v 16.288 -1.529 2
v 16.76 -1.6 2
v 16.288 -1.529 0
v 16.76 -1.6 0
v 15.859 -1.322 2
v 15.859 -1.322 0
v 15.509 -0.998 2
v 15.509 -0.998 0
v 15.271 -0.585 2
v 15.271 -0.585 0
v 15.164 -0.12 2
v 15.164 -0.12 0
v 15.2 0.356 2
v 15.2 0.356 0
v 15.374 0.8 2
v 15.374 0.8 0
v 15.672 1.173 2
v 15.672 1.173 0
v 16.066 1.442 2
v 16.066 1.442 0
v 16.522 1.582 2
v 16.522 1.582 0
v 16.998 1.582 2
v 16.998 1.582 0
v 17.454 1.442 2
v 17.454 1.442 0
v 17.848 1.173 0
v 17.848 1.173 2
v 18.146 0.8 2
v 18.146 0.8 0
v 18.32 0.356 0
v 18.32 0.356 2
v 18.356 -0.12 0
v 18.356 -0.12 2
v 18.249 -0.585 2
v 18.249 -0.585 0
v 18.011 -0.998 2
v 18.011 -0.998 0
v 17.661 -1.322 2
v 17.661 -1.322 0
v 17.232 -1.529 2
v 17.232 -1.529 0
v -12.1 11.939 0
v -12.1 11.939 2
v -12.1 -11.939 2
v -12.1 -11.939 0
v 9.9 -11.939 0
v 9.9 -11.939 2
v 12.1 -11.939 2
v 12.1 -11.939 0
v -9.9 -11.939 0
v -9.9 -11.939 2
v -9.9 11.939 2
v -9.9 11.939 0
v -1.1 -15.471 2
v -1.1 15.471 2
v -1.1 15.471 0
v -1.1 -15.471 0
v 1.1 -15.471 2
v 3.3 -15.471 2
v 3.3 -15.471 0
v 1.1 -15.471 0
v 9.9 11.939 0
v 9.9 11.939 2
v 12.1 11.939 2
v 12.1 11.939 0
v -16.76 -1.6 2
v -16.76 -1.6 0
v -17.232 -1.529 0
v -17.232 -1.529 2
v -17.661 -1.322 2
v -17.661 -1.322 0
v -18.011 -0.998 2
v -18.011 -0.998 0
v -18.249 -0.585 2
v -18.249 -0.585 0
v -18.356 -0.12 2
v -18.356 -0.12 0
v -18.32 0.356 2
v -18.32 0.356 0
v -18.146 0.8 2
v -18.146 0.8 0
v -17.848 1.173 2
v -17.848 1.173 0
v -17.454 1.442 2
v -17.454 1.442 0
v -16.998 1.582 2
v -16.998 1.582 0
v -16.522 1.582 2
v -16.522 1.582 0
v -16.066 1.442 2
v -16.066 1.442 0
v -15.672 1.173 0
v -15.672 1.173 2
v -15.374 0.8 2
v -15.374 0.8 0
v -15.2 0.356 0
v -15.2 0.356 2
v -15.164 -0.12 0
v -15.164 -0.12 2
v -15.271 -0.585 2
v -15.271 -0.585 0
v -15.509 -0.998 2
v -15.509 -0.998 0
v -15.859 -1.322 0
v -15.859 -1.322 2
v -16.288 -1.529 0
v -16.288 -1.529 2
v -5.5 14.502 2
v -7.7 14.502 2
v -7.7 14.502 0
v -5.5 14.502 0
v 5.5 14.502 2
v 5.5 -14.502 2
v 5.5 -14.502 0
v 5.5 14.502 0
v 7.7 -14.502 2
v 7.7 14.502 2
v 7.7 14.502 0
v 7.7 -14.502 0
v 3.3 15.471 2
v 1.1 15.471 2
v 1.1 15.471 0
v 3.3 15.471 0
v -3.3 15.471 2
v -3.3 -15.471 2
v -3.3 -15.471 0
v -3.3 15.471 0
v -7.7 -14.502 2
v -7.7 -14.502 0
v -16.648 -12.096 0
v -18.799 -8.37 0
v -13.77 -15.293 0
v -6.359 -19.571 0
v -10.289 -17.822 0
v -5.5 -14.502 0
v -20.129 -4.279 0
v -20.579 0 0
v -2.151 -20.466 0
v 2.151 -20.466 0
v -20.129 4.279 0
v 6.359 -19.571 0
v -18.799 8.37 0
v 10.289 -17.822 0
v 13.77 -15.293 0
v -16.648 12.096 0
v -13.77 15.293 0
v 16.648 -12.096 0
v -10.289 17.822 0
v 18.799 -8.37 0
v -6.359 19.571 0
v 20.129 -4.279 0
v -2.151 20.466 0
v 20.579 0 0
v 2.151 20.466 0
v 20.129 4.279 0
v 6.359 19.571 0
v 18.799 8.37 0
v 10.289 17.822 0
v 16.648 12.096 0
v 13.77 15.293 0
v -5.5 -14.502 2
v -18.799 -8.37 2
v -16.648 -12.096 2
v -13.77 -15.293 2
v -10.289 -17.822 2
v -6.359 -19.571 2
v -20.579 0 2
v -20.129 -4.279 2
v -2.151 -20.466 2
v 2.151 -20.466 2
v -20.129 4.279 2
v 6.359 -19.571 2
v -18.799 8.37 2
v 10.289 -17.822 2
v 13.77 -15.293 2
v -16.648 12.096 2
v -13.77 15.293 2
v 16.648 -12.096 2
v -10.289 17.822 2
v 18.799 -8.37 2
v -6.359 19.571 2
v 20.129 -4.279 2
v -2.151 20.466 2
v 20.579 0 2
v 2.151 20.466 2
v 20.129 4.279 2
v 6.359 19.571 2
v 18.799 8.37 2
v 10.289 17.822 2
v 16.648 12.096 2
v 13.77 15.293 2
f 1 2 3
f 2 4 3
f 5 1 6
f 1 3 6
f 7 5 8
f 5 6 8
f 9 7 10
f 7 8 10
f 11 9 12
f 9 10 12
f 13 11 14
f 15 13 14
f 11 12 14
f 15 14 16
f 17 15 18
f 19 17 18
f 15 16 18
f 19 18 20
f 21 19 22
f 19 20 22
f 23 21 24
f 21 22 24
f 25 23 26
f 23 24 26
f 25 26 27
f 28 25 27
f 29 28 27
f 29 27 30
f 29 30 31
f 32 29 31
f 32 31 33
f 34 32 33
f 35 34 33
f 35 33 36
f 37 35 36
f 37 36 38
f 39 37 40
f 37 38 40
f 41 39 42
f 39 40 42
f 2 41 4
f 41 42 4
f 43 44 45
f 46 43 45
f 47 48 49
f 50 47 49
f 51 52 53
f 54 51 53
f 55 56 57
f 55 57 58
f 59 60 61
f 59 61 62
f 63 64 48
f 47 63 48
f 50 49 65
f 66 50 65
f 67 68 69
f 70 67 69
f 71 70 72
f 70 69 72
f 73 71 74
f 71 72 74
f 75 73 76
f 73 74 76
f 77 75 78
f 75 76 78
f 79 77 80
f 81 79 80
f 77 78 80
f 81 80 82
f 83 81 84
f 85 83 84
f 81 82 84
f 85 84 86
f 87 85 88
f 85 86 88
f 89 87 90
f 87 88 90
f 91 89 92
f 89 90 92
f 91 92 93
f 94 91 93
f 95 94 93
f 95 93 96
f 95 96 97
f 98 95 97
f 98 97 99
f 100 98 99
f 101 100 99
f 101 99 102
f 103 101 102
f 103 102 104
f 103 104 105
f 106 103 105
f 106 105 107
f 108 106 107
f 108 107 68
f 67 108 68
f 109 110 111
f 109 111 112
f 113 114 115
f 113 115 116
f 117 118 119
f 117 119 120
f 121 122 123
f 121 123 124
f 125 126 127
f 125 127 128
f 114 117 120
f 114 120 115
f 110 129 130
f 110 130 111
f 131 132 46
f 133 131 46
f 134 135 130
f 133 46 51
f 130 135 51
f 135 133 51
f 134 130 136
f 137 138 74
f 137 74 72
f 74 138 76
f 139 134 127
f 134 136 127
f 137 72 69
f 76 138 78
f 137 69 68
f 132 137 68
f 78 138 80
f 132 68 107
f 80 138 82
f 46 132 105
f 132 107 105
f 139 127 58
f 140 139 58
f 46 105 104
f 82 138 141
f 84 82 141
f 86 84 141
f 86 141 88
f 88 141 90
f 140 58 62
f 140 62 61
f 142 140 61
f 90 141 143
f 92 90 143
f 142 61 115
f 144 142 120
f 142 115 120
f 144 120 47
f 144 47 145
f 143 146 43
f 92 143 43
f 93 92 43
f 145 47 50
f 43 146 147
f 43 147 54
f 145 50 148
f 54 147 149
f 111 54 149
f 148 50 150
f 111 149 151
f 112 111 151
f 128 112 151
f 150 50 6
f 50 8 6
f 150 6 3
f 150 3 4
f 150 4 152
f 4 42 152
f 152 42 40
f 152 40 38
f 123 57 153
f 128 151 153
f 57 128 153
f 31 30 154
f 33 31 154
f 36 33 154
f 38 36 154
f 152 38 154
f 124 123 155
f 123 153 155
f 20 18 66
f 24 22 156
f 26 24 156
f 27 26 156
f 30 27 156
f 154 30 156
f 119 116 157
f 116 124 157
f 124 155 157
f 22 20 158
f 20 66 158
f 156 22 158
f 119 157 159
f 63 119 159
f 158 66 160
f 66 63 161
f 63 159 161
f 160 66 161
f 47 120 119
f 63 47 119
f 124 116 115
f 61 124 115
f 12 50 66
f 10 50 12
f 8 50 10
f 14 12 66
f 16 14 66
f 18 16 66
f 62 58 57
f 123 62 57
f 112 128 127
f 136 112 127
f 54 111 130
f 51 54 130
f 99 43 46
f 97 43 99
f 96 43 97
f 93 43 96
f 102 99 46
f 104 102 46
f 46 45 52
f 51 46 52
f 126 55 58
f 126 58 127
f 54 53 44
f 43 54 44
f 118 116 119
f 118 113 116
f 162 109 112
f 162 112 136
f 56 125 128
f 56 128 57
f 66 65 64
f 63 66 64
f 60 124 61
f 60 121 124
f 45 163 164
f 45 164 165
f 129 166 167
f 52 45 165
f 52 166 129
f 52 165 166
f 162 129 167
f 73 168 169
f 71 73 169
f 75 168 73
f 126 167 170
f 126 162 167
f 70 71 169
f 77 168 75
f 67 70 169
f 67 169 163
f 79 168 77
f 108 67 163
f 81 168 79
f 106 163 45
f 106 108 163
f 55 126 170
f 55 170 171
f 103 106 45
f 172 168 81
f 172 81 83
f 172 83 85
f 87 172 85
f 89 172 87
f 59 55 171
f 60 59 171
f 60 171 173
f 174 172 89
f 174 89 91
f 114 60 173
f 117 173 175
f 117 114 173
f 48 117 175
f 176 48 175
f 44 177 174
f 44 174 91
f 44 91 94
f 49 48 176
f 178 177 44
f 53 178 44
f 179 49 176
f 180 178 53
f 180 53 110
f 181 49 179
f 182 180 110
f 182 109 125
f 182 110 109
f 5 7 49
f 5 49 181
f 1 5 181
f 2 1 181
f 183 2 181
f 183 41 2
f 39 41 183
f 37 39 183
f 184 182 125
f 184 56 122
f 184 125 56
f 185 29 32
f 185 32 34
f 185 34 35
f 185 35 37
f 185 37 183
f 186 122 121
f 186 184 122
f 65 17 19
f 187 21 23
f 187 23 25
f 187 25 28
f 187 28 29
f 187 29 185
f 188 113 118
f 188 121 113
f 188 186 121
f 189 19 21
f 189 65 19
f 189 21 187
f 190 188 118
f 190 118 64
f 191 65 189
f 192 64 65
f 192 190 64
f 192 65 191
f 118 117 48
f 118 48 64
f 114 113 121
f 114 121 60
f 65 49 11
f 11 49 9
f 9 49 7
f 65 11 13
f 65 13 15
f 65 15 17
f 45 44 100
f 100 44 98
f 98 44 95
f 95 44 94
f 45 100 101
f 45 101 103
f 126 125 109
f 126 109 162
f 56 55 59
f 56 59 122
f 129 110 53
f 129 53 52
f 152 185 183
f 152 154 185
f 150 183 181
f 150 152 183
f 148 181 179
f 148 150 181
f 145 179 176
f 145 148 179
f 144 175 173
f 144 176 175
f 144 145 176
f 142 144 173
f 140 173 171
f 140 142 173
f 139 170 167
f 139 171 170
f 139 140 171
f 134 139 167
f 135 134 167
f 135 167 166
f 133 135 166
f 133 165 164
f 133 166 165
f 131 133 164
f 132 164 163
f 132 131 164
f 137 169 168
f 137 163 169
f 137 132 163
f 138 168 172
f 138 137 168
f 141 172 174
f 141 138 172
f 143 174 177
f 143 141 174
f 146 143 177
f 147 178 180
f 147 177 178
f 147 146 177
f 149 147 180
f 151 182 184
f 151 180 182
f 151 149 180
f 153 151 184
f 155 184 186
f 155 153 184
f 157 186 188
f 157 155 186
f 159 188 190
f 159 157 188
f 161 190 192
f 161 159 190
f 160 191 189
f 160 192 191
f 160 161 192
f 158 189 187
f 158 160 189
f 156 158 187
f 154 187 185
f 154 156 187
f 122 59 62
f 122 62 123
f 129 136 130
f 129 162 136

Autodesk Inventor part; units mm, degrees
ref_plane "YZ Plane" through (0, 0, 0) normal (1, 0, 0) x (0, 1, 0)
ref_plane "XZ Plane" through (0, 0, 0) normal (0, 1, 0) x (-1, 0, 0)
ref_plane "XY Plane" through (0, 0, 0) normal (0, 0, 1) x (1, 0, 0)
sketch "Skizze1" plane through (0, 0, 0) normal (0, 0, 1) x (1, 0, 0)
  circle A0 centre (16.76, 0) radius 1.25 projected
  circle A1 centre (-16.76, 0) radius 1.25 projected
  line L0 (-6.25, 16) -> (-11.9414, 16) projected
  line L1 (-2.25, 20) -> (-6.25, 16) projected
  line L2 (2.25, 20) -> (-2.25, 20) projected
  line L3 (6.25, 16) -> (2.25, 20) projected
  line L4 (11.9414, 16) -> (6.25, 16) projected
  line L5 (11.9414, 16) -> (12.9414, 15) projected
  line L6 (12.9414, -15) -> (12.9414, 15) projected
  line L7 (11.9414, -16) -> (12.9414, -15) projected
  line L8 (-11.9414, -16) -> (11.9414, -16) projected
  line L9 (-11.9414, -16) -> (-12.9414, -15) projected
  line L10 (-12.9414, 15) -> (-12.9414, -15) projected
  line L11 (-12.9414, 15) -> (-11.9414, 16) projected
  circle A2 centre (0, 0) radius 20.5786 projected
  point P0 (0, 0)
extrude "Extrusion1" add sketch "Skizze1" along normal blind 2 contours L1 L2 L3 L4 L5 L6 L7 L8 L9 L10 L11 L0 | A2
sketch "Skizze2" plane through (0, 0, 2) normal (0, 0, 1) x (1, 0, 0)
  point P0 (0, 0)
sketch "Skizze3" plane through (0, 0, 2) normal (0, 0, 1) x (1, 0, 0)
  line L0 (-12.1, -11.9394) -> (-9.9, -11.9394)
  line L1 (-9.9, -11.9394) -> (-9.9, 11.9394)
  line L2 (-9.9, 11.9394) -> (-12.1, 11.9394)
  line L3 (-12.1, 11.9394) -> (-12.1, -11.9394)
  line L4 (-7.7, 14.502) -> (-5.5, 14.502)
  line L5 (-5.5, 14.502) -> (-5.5, -14.502)
  line L6 (-5.5, -14.502) -> (-7.7, -14.502)
  line L7 (-7.7, -14.502) -> (-7.7, 14.502)
  line L8 (-3.3, 15.4709) -> (-1.1, 15.4709)
  line L9 (-1.1, 15.4709) -> (-1.1, -15.4709)
  line L10 (-1.1, -15.4709) -> (-3.3, -15.4709)
  line L11 (-3.3, -15.4709) -> (-3.3, 15.4709)
  circle A0 centre (-16.76, 0) radius 1.25 projected
  circle A1 centre (16.76, 0) radius 1.25 projected
  circle A2 centre (0, 0) radius 20.5786 projected
  line L12 (-16.76, 0) -> (0, 0) construction
  circle A3 centre (0, 0) radius 15.51 construction
  line L13 (0, 0) -> (0, 15.51)
  point P0 (0, 0)
  dimension "d2" = 2.2
  dimension "d3" = 2.2
  dimension "d4" = 2.2
  dimension "d5" = 2.2
  dimension "d6" = 2.2
  dimension "d7" = 1.1
ref_plane "Arbeitsebene1" through (0, 0, 2) normal (1, 0, 0) x (0, 1, 0)
extrude "Extrusion2" cut sketch "Skizze3" against normal through all contours L3 L2 L1 L0 | L4 L5 L6 L7 | L8 L9 L10 L11
mirror "Spiegeln1" about plane through (0, 0, 2) normal (1, 0, 0) of "Extrusion2"
sketch "Skizze4" plane through (0, 0, 2) normal (0, 0, 1) x (1, 0, 0)
  line L0 (5.5, -14.502) -> (5.5, 14.502) projected
  line L1 (5.5, 14.502) -> (7.7, 14.502) projected
  line L2 (7.7, 14.502) -> (7.7, -14.502) projected
  line L3 (7.7, -14.502) -> (5.5, -14.502) projected
  line L4 (1.1, -15.4709) -> (1.1, 15.4709) projected
  line L5 (1.1, 15.4709) -> (3.3, 15.4709) projected
  line L6 (3.3, 15.4709) -> (3.3, -15.4709) projected
  line L7 (3.3, -15.4709) -> (1.1, -15.4709) projected
  line L8 (9.9, 11.9394) -> (12.1, 11.9394) projected
  line L9 (12.1, 11.9394) -> (12.1, -11.9394) projected
  line L10 (12.1, -11.9394) -> (9.9, -11.9394) projected
  line L11 (9.9, -11.9394) -> (9.9, 11.9394) projected
  line L12 (-7.7, -14.502) -> (-7.7, 14.502) projected
  line L13 (-7.7, 14.502) -> (-5.5, 14.502) projected
  line L14 (-5.5, 14.502) -> (-5.5, -14.502) projected
  line L15 (-5.5, -14.502) -> (-7.7, -14.502) projected
  line L16 (-9.9, 11.9394) -> (-9.9, -11.9394) projected
  line L17 (-9.9, -11.9394) -> (-12.1, -11.9394) projected
  line L18 (-12.1, -11.9394) -> (-12.1, 11.9394) projected
  line L19 (-12.1, 11.9394) -> (-9.9, 11.9394) projected
  line L20 (-3.3, -15.4709) -> (-3.3, 15.4709) projected
  line L21 (-3.3, 15.4709) -> (-1.1, 15.4709) projected
  line L22 (-1.1, 15.4709) -> (-1.1, -15.4709) projected
  line L23 (-1.1, -15.4709) -> (-3.3, -15.4709) projected
  circle A0 centre (-16.76, 0) radius 1.25 projected
  circle A1 centre (16.76, 0) radius 1.25 projected
  circle A2 centre (0, 0) radius 20.5786 projected
  point P0 (0, 0)
hole "Bohrung1" at (-16.76, 0, 2) at (16.76, 0, 2) direction (0, 0, -1) diameter 3.2 end through all
equation "\"d3\" = d2"
equation "\"d4\" = d3"
equation "\"d5\" = d4"
equation "\"d6\" = d3"
equation "\"d7\" = 0.5 * d2"
properties part number "Wrist_Cover" material "ABS-Kunststoff"
